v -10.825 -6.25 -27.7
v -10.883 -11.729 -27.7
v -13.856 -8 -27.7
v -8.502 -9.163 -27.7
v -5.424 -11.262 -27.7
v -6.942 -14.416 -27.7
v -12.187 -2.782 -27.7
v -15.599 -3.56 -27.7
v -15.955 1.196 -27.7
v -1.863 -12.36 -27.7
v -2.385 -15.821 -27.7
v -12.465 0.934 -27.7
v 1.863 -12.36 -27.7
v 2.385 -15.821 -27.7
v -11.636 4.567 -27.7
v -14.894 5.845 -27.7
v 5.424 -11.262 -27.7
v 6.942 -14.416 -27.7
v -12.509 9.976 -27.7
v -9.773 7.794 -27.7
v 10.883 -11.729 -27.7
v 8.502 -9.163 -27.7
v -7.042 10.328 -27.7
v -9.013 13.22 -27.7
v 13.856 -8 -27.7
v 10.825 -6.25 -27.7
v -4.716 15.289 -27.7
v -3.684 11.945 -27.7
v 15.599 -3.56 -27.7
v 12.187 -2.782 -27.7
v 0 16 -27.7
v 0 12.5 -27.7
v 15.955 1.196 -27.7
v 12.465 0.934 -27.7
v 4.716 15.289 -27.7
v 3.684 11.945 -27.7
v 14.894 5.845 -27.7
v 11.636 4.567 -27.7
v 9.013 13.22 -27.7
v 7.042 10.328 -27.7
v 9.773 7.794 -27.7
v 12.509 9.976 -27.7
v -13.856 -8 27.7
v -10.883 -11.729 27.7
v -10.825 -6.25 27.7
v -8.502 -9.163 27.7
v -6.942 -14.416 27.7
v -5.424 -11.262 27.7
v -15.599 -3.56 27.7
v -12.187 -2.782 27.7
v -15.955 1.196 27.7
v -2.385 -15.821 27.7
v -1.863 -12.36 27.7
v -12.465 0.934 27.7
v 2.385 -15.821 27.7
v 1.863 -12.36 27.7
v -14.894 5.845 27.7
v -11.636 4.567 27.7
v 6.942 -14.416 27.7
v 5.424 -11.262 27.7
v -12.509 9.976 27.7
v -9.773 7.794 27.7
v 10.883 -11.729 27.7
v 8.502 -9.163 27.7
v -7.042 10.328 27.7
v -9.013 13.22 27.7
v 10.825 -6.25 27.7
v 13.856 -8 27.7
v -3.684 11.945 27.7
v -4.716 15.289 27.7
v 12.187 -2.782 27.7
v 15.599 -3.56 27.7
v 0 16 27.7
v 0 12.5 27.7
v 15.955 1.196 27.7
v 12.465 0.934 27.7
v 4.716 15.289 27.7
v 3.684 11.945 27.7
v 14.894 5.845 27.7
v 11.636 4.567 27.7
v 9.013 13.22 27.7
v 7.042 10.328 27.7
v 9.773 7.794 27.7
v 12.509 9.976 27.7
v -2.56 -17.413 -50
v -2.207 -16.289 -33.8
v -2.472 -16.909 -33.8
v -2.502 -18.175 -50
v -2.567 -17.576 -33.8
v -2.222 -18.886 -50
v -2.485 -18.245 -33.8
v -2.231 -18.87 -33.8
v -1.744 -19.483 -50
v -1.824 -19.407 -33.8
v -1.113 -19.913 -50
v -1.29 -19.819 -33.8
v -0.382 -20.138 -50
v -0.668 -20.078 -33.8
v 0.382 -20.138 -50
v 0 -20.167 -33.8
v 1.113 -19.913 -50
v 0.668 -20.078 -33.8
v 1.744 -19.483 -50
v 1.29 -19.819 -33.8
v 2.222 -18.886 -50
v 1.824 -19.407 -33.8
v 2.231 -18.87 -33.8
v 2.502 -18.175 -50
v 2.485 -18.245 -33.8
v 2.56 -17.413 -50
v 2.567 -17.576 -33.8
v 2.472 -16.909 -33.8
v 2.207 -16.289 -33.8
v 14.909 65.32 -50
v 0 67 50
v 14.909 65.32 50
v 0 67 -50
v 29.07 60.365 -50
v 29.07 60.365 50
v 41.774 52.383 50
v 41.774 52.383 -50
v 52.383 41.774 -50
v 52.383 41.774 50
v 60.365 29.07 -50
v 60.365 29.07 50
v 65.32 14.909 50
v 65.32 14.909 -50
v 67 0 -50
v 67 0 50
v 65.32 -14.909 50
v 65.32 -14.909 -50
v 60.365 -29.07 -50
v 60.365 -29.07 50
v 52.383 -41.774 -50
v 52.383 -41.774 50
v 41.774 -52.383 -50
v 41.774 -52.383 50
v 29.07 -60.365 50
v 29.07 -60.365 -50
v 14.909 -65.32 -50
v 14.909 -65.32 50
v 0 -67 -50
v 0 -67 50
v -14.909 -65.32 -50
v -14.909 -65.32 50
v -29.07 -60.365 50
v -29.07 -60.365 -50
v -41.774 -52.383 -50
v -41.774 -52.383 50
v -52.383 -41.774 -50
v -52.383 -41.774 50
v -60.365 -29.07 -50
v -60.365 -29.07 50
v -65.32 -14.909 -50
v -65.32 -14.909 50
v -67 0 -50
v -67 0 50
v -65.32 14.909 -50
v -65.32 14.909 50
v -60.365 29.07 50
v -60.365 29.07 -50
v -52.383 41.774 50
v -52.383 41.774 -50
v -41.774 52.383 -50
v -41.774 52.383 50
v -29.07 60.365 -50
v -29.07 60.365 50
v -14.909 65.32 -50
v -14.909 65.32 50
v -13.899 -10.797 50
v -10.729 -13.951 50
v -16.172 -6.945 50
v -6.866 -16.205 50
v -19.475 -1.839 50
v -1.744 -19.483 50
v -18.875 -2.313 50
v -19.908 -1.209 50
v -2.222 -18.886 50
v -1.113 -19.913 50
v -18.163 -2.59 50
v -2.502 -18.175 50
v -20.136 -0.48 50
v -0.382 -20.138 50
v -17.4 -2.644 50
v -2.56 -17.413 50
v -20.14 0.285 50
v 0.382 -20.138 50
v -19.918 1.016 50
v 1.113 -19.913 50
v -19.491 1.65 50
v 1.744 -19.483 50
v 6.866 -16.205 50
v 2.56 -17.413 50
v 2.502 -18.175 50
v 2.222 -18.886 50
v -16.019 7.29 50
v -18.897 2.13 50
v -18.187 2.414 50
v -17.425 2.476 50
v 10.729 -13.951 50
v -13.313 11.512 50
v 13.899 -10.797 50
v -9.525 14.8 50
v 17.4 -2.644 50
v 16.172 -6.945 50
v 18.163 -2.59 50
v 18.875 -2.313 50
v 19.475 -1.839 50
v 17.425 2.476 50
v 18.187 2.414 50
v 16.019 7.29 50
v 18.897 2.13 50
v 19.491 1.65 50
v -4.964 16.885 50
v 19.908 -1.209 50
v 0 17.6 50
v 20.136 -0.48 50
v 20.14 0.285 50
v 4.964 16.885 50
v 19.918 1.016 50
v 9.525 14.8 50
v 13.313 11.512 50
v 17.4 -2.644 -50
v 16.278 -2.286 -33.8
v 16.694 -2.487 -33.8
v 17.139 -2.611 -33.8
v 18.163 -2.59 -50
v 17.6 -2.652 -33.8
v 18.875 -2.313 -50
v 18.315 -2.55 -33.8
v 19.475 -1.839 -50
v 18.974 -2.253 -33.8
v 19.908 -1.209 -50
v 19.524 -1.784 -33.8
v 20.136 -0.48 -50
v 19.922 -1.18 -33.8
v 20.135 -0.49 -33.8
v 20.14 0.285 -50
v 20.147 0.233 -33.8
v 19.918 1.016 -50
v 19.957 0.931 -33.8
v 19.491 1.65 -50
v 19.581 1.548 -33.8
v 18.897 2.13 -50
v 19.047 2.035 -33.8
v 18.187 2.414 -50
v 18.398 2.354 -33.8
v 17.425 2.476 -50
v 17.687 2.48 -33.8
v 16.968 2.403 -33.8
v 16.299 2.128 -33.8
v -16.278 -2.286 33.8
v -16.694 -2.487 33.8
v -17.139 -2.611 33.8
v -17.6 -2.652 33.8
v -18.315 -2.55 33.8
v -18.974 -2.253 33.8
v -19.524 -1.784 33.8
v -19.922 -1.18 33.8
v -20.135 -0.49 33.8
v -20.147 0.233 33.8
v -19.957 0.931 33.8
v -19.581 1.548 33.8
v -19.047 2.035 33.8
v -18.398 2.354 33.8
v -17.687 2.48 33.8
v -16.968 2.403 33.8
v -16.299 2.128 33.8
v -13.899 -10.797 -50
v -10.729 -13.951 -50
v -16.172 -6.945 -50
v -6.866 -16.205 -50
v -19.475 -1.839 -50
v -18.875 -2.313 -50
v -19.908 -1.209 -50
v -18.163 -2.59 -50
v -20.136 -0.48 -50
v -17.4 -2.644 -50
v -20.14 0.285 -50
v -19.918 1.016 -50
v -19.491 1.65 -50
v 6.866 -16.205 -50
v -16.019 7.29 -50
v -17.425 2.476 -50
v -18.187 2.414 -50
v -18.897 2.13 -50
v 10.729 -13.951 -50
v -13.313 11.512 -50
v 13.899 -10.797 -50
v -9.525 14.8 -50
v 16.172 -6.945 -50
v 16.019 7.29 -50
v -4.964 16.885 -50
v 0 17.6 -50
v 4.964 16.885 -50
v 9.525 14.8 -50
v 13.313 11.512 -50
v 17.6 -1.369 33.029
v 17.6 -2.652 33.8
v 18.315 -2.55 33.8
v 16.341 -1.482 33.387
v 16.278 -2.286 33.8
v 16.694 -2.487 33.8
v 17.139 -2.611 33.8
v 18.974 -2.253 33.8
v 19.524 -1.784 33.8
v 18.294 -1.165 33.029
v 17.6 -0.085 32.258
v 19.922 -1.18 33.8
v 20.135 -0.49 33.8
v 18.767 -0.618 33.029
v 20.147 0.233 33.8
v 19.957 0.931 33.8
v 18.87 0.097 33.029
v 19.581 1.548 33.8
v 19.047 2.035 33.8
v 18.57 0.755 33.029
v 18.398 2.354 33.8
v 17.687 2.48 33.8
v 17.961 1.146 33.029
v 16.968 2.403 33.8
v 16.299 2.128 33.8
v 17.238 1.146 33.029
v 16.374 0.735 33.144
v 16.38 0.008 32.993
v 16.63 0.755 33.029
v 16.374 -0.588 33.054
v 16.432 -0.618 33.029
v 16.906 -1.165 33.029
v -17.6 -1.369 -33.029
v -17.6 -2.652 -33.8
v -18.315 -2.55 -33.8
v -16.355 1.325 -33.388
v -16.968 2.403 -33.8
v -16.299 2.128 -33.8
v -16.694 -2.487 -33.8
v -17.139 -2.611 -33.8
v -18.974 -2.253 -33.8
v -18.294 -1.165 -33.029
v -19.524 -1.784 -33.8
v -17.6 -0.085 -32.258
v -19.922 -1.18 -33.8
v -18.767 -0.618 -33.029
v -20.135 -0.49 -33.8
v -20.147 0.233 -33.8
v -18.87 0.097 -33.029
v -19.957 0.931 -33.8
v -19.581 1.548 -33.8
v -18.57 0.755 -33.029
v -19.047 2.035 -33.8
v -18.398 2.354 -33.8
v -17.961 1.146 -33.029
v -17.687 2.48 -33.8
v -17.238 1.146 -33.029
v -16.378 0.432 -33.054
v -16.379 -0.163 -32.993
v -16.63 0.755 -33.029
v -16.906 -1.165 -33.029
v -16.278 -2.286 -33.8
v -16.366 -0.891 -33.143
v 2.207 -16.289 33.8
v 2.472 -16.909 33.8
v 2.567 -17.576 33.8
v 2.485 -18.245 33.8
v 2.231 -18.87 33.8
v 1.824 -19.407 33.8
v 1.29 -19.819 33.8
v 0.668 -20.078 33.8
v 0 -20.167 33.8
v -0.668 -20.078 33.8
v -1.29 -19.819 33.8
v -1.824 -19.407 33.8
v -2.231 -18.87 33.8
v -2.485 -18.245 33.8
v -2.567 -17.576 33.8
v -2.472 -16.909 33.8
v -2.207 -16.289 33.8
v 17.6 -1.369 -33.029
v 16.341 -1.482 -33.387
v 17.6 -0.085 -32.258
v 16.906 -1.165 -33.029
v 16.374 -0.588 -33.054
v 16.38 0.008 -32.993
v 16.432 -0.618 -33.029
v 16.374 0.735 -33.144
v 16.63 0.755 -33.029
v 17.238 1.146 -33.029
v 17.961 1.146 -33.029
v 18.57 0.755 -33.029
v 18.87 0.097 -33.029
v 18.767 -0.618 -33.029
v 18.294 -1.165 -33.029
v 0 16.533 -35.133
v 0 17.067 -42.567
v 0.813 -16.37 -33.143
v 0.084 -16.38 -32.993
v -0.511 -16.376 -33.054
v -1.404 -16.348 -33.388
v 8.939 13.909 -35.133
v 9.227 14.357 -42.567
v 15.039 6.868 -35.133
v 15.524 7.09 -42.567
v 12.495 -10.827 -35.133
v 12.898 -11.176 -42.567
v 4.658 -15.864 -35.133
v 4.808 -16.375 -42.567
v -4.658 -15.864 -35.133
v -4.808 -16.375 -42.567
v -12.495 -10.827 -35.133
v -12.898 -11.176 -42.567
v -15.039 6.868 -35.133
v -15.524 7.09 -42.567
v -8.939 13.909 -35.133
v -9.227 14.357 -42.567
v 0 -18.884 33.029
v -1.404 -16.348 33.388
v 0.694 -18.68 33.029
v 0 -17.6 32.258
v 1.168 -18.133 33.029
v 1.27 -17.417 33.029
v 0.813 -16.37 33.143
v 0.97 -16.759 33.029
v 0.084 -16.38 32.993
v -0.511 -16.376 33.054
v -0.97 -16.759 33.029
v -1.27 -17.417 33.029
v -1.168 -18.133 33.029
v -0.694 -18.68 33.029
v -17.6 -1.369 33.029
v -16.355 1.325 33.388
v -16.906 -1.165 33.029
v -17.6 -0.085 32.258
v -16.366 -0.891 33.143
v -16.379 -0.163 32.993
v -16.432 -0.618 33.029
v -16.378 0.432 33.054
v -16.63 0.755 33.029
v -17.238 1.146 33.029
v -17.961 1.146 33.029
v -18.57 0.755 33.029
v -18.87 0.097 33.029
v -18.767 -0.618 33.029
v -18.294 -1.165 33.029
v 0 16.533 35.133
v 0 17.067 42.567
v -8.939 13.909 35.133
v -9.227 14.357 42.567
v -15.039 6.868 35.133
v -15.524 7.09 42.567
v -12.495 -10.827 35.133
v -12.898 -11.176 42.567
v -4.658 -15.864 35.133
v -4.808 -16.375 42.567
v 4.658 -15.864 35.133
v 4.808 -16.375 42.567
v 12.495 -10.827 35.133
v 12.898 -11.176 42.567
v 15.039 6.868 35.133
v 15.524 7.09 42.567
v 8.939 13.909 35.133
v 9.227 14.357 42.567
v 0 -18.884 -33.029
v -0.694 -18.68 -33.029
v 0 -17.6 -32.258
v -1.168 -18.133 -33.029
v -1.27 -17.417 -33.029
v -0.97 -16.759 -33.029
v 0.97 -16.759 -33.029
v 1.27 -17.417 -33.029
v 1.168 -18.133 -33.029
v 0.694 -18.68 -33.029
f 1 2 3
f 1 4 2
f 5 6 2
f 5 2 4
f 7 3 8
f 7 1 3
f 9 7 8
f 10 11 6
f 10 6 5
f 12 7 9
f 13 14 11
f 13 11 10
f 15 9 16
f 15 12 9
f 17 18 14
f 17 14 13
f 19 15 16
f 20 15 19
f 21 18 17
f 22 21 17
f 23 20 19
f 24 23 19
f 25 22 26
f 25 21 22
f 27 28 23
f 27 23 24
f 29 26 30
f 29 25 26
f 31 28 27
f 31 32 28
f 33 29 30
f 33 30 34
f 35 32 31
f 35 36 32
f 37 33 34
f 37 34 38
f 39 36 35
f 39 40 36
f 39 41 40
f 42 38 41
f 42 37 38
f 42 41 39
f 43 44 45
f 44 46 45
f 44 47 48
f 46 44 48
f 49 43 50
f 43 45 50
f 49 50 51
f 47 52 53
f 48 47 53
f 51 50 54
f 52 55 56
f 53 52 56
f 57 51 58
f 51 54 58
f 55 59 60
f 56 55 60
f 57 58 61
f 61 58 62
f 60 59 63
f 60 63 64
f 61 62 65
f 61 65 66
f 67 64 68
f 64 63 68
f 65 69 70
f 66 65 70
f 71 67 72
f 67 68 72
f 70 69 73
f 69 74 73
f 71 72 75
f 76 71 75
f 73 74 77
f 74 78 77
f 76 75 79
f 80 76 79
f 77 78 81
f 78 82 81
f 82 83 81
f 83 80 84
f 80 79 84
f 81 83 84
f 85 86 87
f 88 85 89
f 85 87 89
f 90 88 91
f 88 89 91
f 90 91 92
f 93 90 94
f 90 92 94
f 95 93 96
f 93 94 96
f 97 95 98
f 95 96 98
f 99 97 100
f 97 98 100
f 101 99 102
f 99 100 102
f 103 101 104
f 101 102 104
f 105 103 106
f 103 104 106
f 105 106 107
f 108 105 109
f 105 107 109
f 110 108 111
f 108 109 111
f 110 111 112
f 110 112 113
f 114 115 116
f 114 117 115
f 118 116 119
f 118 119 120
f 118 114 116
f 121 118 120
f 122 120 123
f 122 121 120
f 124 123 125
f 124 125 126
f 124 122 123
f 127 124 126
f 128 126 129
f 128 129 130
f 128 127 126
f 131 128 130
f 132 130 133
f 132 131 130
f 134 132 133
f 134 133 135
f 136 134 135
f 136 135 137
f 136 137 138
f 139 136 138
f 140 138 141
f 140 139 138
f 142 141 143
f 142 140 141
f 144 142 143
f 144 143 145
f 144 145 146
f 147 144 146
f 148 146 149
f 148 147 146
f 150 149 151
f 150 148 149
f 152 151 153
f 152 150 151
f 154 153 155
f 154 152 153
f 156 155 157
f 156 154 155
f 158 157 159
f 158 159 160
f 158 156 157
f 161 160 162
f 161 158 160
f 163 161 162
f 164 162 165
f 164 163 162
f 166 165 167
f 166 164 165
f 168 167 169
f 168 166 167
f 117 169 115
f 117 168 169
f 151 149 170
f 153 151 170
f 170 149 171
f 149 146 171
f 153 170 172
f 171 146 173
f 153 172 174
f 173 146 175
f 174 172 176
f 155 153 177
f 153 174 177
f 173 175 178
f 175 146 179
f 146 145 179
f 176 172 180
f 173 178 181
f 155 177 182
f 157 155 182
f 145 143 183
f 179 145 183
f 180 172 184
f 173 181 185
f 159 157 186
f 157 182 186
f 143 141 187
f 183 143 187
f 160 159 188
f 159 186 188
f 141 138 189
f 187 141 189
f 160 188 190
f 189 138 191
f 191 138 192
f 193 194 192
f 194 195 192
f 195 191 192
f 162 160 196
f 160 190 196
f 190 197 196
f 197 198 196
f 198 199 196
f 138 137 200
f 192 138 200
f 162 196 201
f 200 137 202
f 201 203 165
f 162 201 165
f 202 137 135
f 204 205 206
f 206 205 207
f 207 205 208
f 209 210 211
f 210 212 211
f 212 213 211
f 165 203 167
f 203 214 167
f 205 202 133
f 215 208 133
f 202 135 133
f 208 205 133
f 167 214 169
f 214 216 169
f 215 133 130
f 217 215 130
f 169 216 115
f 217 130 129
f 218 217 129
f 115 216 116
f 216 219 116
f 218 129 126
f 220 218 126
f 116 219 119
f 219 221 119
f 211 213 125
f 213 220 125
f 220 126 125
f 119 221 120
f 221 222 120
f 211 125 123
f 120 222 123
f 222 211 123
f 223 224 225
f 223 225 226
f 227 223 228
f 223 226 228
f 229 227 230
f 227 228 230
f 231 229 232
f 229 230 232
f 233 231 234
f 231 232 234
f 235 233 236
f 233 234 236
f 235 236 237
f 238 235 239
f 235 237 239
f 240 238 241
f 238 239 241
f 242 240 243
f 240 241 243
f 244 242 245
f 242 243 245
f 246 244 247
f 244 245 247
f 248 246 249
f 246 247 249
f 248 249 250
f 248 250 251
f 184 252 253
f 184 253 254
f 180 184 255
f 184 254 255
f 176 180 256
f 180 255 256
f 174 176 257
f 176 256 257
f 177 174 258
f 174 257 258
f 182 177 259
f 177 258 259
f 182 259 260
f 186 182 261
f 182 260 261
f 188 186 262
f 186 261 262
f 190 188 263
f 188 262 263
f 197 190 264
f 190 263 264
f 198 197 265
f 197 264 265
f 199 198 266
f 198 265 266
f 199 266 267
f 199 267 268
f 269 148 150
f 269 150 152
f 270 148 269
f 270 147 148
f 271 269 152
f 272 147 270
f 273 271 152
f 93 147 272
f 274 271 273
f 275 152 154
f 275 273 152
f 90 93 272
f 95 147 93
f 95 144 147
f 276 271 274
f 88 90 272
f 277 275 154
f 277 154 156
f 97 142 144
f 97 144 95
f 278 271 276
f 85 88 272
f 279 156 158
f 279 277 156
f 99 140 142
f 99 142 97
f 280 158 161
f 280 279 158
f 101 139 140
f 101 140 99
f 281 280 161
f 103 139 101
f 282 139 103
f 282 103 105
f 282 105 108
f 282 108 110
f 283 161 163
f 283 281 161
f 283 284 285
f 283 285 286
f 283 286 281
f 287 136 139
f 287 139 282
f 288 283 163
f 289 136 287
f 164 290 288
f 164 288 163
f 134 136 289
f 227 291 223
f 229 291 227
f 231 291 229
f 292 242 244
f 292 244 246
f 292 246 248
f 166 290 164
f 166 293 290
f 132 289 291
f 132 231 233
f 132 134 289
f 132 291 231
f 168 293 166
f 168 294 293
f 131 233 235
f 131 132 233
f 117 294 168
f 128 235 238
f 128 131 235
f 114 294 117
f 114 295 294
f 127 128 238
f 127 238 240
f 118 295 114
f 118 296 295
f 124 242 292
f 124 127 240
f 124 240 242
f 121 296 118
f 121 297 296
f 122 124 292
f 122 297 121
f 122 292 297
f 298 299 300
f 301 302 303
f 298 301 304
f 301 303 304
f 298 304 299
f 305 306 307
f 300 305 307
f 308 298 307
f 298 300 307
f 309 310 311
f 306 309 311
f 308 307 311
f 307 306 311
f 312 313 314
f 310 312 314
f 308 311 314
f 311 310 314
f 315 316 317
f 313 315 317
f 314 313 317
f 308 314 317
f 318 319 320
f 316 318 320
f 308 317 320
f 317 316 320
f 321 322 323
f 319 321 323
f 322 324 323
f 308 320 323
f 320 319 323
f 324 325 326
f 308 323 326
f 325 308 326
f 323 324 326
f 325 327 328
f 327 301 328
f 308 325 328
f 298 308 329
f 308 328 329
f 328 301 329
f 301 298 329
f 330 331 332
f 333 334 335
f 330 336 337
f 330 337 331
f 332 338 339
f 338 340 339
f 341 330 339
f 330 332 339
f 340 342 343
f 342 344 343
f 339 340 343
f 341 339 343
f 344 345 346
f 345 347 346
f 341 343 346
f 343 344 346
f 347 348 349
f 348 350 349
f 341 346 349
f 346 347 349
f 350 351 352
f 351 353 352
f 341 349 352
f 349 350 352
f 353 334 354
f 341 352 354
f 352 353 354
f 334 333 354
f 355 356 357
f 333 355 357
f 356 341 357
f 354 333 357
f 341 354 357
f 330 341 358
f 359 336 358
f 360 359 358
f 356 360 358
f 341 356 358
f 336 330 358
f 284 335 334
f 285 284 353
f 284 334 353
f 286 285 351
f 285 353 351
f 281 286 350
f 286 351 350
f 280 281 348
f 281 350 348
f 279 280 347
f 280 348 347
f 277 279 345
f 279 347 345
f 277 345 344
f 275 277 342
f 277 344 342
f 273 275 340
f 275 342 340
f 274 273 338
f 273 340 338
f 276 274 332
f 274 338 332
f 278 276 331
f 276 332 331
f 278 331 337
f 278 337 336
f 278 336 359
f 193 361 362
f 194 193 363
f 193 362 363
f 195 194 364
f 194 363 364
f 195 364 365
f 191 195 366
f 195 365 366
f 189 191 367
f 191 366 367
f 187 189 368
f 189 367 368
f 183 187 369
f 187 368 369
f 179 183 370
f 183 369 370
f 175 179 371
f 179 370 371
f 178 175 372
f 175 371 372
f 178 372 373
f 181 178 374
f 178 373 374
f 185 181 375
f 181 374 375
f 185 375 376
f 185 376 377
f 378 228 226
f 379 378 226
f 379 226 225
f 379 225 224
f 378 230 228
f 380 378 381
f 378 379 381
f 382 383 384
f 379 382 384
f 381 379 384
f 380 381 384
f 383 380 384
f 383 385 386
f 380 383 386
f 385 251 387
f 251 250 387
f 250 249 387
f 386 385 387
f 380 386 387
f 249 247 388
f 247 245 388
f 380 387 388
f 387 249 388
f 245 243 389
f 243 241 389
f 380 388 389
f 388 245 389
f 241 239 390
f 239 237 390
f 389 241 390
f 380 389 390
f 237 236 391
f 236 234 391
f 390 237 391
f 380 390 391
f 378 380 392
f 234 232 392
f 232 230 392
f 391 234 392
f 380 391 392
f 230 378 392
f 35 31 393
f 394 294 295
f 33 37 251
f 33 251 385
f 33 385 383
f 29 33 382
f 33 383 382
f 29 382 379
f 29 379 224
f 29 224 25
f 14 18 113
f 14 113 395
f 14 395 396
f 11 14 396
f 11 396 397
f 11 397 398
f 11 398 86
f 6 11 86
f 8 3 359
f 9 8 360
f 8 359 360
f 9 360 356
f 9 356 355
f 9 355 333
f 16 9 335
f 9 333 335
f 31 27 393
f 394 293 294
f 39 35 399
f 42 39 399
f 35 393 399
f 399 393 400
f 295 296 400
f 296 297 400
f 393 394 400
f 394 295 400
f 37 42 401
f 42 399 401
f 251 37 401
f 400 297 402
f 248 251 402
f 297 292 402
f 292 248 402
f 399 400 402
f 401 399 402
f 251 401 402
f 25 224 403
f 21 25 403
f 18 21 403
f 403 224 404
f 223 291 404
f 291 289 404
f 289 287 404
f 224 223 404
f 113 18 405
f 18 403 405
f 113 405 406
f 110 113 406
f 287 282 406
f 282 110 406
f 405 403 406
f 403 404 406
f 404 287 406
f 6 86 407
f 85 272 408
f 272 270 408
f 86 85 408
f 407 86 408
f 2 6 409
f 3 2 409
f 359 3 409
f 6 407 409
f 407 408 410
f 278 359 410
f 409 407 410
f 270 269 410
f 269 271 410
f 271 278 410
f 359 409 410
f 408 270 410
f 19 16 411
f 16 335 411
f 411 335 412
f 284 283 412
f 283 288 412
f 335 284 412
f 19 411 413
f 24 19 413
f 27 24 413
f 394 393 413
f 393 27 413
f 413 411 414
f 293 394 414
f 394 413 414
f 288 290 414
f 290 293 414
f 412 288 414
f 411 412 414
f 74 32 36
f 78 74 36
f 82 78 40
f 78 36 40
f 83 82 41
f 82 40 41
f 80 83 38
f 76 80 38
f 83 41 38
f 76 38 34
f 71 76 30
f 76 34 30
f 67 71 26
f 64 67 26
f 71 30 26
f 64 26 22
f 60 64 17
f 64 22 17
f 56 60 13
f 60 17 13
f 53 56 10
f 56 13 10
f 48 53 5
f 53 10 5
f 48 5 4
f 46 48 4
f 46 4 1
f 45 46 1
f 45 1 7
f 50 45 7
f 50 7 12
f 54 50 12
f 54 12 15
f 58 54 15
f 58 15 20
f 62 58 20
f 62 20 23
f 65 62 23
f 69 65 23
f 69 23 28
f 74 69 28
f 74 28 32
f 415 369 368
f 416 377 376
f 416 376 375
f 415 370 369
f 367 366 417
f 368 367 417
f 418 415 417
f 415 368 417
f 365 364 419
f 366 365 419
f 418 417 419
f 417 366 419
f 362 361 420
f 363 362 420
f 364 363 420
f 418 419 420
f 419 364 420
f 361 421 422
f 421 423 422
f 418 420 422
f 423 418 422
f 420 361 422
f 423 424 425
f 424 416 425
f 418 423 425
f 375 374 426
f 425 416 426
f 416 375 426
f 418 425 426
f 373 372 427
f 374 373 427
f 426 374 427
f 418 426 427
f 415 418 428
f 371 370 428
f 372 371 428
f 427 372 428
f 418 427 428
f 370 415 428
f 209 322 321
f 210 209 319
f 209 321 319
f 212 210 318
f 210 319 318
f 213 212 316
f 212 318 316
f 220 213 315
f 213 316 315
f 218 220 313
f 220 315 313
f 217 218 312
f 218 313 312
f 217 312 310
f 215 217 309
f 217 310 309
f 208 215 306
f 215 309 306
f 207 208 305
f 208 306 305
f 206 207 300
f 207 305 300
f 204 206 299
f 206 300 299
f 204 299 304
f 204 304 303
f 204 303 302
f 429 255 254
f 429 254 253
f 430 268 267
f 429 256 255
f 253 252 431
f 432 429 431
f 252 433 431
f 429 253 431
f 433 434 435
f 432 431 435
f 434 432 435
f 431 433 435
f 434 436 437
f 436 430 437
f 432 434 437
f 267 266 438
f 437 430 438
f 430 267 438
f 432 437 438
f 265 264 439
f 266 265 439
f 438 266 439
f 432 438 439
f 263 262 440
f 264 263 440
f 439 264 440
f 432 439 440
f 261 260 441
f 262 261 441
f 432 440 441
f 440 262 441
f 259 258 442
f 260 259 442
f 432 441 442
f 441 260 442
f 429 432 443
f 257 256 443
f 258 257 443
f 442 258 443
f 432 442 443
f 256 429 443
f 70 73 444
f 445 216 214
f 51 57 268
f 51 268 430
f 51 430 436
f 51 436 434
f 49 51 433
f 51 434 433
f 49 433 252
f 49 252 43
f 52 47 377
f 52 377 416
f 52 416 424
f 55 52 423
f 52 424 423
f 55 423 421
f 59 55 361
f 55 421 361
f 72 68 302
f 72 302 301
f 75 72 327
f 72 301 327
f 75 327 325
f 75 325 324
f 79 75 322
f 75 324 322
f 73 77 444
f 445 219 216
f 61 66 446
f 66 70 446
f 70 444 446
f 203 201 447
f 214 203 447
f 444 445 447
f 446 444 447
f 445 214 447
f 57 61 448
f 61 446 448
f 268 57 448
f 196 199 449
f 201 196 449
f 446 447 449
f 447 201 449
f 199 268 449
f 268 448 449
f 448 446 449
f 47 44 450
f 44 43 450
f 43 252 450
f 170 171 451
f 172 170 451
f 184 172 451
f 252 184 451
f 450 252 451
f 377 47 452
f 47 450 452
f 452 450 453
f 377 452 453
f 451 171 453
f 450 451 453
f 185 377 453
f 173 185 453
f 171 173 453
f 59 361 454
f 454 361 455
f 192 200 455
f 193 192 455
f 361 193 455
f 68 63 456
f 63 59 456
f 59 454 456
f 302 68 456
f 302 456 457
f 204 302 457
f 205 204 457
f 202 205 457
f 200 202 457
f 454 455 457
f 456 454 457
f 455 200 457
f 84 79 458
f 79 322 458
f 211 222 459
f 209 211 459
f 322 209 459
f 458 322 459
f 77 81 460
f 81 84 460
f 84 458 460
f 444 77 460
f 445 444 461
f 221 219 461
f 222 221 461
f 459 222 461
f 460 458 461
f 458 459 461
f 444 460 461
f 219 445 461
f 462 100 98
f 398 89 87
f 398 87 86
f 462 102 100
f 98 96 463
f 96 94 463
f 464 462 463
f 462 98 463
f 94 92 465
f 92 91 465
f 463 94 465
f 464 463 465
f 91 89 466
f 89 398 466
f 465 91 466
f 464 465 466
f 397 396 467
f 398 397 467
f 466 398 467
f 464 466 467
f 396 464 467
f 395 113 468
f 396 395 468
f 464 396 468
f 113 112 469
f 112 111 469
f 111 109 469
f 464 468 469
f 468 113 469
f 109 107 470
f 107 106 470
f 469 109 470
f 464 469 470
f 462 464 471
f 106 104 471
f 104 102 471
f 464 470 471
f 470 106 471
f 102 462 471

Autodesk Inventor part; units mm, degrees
ref_plane "YZ Plane" through (0, 0, 0) normal (1, 0, 0) x (0, 1, 0)
ref_plane "XZ Plane" through (0, 0, 0) normal (0, 1, 0) x (-1, 0, 0)
ref_plane "XY Plane" through (0, 0, 0) normal (0, 0, 1) x (1, 0, 0)
sketch "Esquisse3" plane through (0, 0, 0) normal (1, 0, 0) x (0, 1, 0)
  line L0 (12.5, 50) -> (17.6, 50)
  line L1 (12.5, 27.7) -> (16, 27.7)
  line L2 (16, 27.7) -> (17.6, 50)
  line L3 (-39.3437, 0) -> (46.6159, 0)
  line L4 (12.5, -50) -> (17.6, -50)
  line L5 (12.5, -27.7) -> (16, -27.7)
  line L6 (16, -27.7) -> (17.6, -50)
  line L7 (12.5, -50) -> (12.5, -27.7)
  line L8 (0, 98.6871) -> (0, -122.4022)
  line L9 (17.6, 50) -> (67, 50)
  line L10 (67, 50) -> (67, -50)
  line L11 (67, -50) -> (17.6, -50)
  line L12 (12.5, 50) -> (12.5, 27.7)
  line L13 (12.5, 27.7) -> (12.5, -27.7)
  point P0 (0, 0)
  point P1 (40.7356, 59.8426)
  point P2 (56.7464, 59.8426)
  point P3 (58.3249, 81.8426)
  point P4 (40.7356, 81.8426)
  dimension "d14" = 22.3
  dimension "d19" = 0
  dimension "d20" = 100
  dimension "d21" = 0
  dimension "d22" = 25
  dimension "d23" = 134
  dimension "d25" = 35.2
  dimension "d26" = 32
revolve "Révolution1" add sketch "Esquisse3" angle 360 about axis through (0, 0, 98.6871) along (0, 0, -1) contours L9 L10 L11 L6 L5 L13 L1 L2
sketch "Esquisse4" plane through (0, 0, 50) normal (0, 0, 1) x (1, 0, 0)
  circle A0 centre (0, 0) radius 17.6 projected
  line L0 (-27.4685, -0.0852) -> (22.7682, -0.0852)
  line L1 (0, 22.4796) -> (0, -21.2618)
  point P0 (0, 0)
  point P1 (17.5998, -0.0852)
  point P2 (0, -17.6)
  point P3 (-17.5998, -0.0852)
hole "Perçage2" at (17.5998, -0.0852, 50) at (0, -17.6, 50) at (-17.5998, -0.0852, 50) direction (0, 0, -1) diameter 5.134 depth 16.2 tip angle 118 thread size "M6x0.8" class "6H" standard "ISO Metric profile"
mirror "Mise en miroir1" about plane through (0, 0, 0) normal (0, 0, 1) of "Perçage2"
properties part number "Masse"
